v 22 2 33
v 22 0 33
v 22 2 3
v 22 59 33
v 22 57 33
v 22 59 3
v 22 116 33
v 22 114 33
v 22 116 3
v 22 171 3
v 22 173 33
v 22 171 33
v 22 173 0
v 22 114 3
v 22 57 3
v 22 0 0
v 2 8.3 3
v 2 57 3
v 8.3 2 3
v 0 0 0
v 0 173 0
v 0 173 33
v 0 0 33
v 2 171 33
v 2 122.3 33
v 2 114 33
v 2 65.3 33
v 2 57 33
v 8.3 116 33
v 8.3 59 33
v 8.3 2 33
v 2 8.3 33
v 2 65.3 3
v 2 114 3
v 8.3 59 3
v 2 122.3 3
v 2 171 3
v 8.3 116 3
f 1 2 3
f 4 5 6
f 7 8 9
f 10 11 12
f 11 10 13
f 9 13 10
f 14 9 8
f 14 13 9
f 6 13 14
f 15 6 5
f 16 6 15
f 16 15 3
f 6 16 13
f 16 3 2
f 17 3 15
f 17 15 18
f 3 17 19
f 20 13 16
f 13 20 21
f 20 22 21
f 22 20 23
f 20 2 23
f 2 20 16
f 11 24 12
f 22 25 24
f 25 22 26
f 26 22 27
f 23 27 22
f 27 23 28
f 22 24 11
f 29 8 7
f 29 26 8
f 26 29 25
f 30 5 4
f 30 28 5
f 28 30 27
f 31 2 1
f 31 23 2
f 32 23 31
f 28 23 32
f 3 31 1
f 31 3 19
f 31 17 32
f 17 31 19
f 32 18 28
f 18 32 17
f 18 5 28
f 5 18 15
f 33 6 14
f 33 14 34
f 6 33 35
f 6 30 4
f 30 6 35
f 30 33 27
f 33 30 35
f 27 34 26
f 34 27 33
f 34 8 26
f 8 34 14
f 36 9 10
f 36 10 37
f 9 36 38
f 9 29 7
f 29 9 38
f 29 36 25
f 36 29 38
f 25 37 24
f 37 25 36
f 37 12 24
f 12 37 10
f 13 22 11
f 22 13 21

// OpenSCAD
// OpenSCAD code for the Modern Gridfinity Case bracket for Skadis

// --- Global Parameters ---
base_width = 30;     // X-axis dimension (also width of the L-bracket extrusion)
base_height = 3;     // Z-axis dimension (thickness of the base segment)

// Parameters for the L-shaped brackets
bracket_thickness = 2;        // Thickness of the L-bracket's wall (material thickness)
vertical_arm_height = 55;     // Height of the vertical arm of the L-bracket (from the base_height upwards)
horizontal_arm_length = 20;    // Length of the horizontal lip of the L-bracket (extending outwards)
chamfer_offset = 6.3;           // The offset distance for the 45-degree inner chamfer from the sharp inner corner

// Parameters for the optional top arm (only for the last bracket)
top_arm_length = 15;          // Length of the top arm extending from the vertical arm (along Y-axis)
top_arm_thickness = 3;        // Thickness of the top arm (along Z-axis)

// Calculated footprint of the L-bracket along the Y-axis.
l_bracket_y_footprint = vertical_arm_height + bracket_thickness; 
l_bracket_x_footprint = horizontal_arm_length + bracket_thickness; 

// Number of bracket units to create
num_brackets = 3; 

// --- L-Bracket Module Definition ---
module l_bracket_component(is_last_bracket = false) {
    union() {
        points = [
            [0, 0], // P0: Bottom-left point of the overall L-bracket profile (on the base plane)
            [horizontal_arm_length + bracket_thickness, 0], // P1: Bottom-right point (end of horizontal arm at base level)
            [horizontal_arm_length + bracket_thickness, bracket_thickness], // P2: Top-right point of the horizontal arm (outer edge)
            [bracket_thickness + chamfer_offset, bracket_thickness], // P3: Point on the horizontal arm side of the 45-degree inner chamfer
            [bracket_thickness, bracket_thickness + chamfer_offset], // P4: Point on the vertical arm side of the 45-degree inner chamfer
            [bracket_thickness, vertical_arm_height + bracket_thickness], // P5: Top-right point of the vertical arm (inner edge)
            [0, vertical_arm_height + bracket_thickness] // P6: Top-left point of the entire L-bracket profile (outer edge of vertical arm)
        ];

        linear_extrude(height = base_width) { 
            polygon(points = points);
        }

        // Conditionally add the top arm if this is the last bracket
        if (is_last_bracket) {
            translate([0, vertical_arm_height - bracket_thickness/2 + top_arm_thickness, 0]) {
                cube(size = [l_bracket_x_footprint, bracket_thickness, base_width]);
            }
        }
    }
}

module single_bracket_assembly_unit(is_last_bracket = false) {
    union() {
        // 1. Create the "back wall" segment of the base.
        cube(size = [l_bracket_x_footprint, l_bracket_y_footprint+bracket_thickness, base_height]);

        // 2. Place the L-bracket component directly on top of this base segment.
        translate([0, 0, base_height]) {
            l_bracket_component(is_last_bracket = is_last_bracket);
        }
    }
}

// --- Main Assembly ---
for (i = [0 : num_brackets - 1]) {
    is_current_bracket_last = (i == num_brackets - 1);
    translate([0, i * l_bracket_y_footprint, 0]) {
        single_bracket_assembly_unit(is_last_bracket = is_current_bracket_last);
    }
}
